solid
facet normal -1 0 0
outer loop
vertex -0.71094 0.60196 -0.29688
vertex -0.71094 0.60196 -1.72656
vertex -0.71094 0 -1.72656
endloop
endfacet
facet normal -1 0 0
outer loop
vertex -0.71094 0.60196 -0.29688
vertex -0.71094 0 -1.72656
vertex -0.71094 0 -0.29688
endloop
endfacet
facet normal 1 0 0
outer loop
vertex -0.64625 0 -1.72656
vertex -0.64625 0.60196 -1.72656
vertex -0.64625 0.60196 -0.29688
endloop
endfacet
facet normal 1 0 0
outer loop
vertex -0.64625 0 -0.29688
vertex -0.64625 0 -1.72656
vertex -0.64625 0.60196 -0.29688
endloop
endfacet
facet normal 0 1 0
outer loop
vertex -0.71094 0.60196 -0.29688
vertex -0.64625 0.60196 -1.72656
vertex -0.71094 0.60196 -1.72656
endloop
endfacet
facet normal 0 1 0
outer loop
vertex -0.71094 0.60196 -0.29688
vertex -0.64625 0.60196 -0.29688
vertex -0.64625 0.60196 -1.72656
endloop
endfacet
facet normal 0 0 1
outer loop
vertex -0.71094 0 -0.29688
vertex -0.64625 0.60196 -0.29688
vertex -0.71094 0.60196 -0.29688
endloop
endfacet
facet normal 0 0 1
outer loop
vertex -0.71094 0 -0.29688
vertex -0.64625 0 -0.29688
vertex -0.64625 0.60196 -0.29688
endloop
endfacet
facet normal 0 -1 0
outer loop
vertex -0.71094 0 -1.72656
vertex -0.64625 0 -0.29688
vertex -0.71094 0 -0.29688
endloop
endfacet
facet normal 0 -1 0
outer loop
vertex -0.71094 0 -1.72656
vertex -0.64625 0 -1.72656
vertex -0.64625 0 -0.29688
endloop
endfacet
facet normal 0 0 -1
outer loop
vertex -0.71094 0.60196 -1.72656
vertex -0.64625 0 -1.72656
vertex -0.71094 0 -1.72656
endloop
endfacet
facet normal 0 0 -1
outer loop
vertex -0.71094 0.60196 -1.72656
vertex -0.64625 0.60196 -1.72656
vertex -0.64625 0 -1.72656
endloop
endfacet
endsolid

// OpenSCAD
EPS = 0.01;

translate([-0.7109375, 0.0, -0.296875])
rotate([0, 90, 0])
linear_extrude(height=0.0546875 + EPS)
    polygon(points=[[1.4296875, 0.0], [1.4296875, 0.6019736842105263], [0.0, 0.6019736842105263], [0.0, 0.0]]);
